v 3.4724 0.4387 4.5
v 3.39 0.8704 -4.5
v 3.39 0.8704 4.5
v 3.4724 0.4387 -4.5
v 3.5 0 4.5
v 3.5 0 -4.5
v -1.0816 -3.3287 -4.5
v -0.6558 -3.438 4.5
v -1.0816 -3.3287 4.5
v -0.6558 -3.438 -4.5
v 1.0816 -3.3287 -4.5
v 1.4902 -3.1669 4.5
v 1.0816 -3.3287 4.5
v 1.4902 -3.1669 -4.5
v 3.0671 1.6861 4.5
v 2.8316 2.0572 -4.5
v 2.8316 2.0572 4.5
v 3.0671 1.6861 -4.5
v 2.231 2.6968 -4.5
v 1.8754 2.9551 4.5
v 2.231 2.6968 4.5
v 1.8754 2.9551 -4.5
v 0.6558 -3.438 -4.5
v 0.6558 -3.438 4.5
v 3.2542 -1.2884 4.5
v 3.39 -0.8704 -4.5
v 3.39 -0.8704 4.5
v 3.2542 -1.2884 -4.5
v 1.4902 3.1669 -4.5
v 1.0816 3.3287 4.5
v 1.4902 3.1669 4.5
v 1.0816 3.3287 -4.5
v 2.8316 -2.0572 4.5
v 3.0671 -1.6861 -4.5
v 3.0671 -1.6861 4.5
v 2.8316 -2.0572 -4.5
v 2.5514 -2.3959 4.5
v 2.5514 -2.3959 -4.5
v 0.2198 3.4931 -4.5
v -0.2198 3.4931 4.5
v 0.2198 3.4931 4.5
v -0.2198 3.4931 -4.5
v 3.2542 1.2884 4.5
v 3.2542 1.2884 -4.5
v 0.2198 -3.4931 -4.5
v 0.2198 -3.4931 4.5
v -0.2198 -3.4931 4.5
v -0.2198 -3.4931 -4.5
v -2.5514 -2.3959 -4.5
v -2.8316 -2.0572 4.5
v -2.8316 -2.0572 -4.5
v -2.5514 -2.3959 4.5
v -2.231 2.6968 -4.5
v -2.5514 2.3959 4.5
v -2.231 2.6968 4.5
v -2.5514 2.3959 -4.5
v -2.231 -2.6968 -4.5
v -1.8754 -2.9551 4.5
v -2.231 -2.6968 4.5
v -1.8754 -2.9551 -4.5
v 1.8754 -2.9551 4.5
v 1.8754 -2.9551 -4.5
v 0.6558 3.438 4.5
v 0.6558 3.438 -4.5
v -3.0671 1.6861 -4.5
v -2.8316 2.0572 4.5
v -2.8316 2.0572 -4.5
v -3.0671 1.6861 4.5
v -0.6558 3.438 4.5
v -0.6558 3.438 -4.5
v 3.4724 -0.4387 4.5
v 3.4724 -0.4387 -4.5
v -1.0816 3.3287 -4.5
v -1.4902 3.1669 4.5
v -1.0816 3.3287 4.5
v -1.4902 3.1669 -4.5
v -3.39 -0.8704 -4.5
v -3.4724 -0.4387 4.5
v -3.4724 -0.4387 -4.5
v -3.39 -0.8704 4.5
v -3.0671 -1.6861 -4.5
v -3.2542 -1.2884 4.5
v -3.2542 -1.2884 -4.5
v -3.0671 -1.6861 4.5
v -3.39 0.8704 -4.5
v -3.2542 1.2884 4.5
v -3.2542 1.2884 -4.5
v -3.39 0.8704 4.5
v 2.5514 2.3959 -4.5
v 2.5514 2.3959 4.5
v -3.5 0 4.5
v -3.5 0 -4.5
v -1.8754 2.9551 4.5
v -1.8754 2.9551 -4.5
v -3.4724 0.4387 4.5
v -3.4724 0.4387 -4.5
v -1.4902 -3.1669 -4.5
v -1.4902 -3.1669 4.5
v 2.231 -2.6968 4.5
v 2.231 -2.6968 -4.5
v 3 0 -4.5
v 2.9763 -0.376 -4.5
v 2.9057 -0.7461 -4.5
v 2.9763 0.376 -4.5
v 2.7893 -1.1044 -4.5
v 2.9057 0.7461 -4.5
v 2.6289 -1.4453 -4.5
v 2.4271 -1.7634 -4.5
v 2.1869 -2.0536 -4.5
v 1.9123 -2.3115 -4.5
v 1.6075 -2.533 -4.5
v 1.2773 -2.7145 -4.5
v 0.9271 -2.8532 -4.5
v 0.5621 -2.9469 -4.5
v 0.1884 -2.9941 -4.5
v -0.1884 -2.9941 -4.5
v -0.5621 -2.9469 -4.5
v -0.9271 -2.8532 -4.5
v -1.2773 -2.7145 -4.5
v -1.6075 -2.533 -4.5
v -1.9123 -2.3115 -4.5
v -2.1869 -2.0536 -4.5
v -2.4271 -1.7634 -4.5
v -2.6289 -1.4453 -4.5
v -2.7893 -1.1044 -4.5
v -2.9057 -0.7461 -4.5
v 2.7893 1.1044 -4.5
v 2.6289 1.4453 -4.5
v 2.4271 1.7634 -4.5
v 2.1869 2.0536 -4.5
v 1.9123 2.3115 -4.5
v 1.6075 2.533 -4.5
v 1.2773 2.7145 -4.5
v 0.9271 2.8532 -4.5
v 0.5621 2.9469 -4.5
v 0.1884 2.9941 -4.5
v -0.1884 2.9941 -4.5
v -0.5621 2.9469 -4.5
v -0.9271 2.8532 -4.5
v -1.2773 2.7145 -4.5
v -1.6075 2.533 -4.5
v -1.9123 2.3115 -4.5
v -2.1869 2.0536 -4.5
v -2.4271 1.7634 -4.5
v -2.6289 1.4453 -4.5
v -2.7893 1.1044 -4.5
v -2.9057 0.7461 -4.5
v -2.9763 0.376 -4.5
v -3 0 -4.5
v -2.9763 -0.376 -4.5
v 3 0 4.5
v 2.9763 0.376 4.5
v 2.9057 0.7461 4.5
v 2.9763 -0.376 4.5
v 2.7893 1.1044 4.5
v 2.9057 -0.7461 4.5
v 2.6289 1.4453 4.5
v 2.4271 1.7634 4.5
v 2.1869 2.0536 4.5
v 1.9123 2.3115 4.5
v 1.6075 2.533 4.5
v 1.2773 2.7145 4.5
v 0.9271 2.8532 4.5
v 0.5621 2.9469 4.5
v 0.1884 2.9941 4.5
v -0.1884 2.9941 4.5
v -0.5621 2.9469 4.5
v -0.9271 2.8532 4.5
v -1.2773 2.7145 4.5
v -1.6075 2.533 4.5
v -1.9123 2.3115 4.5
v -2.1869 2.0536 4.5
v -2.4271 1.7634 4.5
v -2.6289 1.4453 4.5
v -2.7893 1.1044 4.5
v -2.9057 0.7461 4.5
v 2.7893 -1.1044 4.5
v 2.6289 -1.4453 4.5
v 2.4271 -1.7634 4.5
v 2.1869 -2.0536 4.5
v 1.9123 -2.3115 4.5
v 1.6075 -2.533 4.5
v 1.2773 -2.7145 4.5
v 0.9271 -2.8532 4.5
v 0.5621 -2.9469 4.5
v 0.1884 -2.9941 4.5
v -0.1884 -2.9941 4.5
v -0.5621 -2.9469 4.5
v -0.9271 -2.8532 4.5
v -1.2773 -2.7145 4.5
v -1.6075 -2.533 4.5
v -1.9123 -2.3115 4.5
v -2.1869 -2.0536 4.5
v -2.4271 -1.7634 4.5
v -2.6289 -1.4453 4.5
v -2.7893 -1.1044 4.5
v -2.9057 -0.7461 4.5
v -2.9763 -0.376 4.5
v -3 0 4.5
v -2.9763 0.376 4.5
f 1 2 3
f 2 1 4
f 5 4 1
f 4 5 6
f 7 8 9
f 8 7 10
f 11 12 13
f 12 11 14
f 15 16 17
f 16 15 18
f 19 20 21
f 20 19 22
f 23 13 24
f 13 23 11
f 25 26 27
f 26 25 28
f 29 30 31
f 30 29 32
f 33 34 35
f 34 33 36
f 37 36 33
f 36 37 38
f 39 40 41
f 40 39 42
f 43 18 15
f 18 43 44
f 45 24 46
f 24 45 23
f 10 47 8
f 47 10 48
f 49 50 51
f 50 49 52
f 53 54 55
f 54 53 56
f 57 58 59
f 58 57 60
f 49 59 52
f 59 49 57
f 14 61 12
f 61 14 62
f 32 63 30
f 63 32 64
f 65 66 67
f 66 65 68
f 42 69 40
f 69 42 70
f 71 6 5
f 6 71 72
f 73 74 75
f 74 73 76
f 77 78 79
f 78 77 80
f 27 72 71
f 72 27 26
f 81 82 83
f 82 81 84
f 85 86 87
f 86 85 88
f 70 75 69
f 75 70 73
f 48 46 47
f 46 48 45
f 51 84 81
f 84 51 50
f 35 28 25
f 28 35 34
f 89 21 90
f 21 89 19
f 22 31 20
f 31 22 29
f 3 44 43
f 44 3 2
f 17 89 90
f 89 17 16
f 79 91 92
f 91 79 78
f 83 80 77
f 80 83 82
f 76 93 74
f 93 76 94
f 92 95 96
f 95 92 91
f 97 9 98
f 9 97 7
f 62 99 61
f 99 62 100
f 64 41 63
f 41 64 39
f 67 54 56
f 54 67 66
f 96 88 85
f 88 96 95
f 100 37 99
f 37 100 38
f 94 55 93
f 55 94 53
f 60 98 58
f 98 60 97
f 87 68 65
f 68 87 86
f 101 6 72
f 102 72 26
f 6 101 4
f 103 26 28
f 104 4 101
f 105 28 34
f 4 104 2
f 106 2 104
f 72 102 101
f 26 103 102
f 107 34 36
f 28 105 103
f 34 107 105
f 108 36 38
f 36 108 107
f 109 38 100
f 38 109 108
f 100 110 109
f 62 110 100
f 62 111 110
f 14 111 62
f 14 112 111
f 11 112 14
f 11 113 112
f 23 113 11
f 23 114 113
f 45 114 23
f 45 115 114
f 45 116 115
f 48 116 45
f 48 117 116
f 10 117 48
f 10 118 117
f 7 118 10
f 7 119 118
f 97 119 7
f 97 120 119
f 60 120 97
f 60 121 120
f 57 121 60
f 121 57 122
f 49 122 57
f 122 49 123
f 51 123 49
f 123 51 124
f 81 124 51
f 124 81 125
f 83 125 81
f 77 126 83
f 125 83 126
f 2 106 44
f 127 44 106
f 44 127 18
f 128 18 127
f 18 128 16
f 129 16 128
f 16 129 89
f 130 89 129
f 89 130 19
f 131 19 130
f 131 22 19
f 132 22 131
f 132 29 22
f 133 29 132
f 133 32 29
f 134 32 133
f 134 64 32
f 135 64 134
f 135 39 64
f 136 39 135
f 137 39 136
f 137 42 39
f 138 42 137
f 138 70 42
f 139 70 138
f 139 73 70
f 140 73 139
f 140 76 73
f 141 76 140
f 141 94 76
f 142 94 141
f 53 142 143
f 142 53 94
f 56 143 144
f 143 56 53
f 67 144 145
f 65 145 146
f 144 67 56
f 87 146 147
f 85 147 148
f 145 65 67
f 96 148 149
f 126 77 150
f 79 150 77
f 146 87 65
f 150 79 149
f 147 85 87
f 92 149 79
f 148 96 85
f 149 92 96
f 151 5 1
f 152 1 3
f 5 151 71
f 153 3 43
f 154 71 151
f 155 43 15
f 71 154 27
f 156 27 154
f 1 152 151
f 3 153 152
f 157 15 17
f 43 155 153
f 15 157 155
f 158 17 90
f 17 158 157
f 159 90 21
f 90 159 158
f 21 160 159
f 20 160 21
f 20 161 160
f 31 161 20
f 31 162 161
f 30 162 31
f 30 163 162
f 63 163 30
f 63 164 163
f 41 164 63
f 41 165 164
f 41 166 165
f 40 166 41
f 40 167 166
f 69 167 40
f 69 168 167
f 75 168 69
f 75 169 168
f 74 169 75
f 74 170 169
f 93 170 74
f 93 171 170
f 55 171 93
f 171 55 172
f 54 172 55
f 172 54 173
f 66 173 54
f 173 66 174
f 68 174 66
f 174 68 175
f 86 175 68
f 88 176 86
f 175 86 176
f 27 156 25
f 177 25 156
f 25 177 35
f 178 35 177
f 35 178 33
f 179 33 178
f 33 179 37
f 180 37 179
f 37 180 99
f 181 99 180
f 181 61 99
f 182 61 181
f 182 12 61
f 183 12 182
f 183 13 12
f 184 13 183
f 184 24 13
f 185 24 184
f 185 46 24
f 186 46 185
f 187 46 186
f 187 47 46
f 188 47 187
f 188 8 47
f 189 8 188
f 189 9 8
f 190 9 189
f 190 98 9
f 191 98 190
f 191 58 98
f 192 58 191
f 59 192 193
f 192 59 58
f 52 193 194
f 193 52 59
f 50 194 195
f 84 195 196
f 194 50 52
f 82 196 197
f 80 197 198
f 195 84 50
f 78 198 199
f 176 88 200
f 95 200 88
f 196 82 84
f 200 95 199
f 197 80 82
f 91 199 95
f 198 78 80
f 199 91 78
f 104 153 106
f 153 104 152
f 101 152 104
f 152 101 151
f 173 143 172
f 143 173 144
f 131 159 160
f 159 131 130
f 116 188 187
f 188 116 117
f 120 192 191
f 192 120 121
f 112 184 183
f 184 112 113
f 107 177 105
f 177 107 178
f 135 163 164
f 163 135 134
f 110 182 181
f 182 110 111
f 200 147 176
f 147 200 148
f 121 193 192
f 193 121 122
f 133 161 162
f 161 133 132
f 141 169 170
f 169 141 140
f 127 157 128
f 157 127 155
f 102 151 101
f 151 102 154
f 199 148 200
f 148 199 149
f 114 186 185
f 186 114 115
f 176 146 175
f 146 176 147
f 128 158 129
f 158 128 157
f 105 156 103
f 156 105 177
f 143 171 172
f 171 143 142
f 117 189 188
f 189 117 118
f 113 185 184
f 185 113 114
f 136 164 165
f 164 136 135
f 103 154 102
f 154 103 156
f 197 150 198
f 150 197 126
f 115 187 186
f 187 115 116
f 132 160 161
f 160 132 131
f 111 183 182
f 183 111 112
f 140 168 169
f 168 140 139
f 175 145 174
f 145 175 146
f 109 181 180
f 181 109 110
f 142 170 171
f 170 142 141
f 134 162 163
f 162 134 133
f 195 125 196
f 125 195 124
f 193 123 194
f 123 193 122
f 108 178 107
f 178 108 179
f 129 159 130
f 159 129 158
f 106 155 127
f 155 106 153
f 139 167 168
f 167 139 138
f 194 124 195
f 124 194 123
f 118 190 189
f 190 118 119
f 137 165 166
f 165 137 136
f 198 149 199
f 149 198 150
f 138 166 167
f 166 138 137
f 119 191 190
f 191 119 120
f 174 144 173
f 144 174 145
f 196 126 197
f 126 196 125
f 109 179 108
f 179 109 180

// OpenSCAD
$fn = 50;


difference() {
	union() {
		translate(v = [0, 0, -4.5000000000]) {
			cylinder(h = 9, r = 3.5000000000);
		}
	}
	union() {
		translate(v = [0, 0, -100.0000000000]) {
			cylinder(h = 200, r = 3.0000000000);
		}
	}
}
